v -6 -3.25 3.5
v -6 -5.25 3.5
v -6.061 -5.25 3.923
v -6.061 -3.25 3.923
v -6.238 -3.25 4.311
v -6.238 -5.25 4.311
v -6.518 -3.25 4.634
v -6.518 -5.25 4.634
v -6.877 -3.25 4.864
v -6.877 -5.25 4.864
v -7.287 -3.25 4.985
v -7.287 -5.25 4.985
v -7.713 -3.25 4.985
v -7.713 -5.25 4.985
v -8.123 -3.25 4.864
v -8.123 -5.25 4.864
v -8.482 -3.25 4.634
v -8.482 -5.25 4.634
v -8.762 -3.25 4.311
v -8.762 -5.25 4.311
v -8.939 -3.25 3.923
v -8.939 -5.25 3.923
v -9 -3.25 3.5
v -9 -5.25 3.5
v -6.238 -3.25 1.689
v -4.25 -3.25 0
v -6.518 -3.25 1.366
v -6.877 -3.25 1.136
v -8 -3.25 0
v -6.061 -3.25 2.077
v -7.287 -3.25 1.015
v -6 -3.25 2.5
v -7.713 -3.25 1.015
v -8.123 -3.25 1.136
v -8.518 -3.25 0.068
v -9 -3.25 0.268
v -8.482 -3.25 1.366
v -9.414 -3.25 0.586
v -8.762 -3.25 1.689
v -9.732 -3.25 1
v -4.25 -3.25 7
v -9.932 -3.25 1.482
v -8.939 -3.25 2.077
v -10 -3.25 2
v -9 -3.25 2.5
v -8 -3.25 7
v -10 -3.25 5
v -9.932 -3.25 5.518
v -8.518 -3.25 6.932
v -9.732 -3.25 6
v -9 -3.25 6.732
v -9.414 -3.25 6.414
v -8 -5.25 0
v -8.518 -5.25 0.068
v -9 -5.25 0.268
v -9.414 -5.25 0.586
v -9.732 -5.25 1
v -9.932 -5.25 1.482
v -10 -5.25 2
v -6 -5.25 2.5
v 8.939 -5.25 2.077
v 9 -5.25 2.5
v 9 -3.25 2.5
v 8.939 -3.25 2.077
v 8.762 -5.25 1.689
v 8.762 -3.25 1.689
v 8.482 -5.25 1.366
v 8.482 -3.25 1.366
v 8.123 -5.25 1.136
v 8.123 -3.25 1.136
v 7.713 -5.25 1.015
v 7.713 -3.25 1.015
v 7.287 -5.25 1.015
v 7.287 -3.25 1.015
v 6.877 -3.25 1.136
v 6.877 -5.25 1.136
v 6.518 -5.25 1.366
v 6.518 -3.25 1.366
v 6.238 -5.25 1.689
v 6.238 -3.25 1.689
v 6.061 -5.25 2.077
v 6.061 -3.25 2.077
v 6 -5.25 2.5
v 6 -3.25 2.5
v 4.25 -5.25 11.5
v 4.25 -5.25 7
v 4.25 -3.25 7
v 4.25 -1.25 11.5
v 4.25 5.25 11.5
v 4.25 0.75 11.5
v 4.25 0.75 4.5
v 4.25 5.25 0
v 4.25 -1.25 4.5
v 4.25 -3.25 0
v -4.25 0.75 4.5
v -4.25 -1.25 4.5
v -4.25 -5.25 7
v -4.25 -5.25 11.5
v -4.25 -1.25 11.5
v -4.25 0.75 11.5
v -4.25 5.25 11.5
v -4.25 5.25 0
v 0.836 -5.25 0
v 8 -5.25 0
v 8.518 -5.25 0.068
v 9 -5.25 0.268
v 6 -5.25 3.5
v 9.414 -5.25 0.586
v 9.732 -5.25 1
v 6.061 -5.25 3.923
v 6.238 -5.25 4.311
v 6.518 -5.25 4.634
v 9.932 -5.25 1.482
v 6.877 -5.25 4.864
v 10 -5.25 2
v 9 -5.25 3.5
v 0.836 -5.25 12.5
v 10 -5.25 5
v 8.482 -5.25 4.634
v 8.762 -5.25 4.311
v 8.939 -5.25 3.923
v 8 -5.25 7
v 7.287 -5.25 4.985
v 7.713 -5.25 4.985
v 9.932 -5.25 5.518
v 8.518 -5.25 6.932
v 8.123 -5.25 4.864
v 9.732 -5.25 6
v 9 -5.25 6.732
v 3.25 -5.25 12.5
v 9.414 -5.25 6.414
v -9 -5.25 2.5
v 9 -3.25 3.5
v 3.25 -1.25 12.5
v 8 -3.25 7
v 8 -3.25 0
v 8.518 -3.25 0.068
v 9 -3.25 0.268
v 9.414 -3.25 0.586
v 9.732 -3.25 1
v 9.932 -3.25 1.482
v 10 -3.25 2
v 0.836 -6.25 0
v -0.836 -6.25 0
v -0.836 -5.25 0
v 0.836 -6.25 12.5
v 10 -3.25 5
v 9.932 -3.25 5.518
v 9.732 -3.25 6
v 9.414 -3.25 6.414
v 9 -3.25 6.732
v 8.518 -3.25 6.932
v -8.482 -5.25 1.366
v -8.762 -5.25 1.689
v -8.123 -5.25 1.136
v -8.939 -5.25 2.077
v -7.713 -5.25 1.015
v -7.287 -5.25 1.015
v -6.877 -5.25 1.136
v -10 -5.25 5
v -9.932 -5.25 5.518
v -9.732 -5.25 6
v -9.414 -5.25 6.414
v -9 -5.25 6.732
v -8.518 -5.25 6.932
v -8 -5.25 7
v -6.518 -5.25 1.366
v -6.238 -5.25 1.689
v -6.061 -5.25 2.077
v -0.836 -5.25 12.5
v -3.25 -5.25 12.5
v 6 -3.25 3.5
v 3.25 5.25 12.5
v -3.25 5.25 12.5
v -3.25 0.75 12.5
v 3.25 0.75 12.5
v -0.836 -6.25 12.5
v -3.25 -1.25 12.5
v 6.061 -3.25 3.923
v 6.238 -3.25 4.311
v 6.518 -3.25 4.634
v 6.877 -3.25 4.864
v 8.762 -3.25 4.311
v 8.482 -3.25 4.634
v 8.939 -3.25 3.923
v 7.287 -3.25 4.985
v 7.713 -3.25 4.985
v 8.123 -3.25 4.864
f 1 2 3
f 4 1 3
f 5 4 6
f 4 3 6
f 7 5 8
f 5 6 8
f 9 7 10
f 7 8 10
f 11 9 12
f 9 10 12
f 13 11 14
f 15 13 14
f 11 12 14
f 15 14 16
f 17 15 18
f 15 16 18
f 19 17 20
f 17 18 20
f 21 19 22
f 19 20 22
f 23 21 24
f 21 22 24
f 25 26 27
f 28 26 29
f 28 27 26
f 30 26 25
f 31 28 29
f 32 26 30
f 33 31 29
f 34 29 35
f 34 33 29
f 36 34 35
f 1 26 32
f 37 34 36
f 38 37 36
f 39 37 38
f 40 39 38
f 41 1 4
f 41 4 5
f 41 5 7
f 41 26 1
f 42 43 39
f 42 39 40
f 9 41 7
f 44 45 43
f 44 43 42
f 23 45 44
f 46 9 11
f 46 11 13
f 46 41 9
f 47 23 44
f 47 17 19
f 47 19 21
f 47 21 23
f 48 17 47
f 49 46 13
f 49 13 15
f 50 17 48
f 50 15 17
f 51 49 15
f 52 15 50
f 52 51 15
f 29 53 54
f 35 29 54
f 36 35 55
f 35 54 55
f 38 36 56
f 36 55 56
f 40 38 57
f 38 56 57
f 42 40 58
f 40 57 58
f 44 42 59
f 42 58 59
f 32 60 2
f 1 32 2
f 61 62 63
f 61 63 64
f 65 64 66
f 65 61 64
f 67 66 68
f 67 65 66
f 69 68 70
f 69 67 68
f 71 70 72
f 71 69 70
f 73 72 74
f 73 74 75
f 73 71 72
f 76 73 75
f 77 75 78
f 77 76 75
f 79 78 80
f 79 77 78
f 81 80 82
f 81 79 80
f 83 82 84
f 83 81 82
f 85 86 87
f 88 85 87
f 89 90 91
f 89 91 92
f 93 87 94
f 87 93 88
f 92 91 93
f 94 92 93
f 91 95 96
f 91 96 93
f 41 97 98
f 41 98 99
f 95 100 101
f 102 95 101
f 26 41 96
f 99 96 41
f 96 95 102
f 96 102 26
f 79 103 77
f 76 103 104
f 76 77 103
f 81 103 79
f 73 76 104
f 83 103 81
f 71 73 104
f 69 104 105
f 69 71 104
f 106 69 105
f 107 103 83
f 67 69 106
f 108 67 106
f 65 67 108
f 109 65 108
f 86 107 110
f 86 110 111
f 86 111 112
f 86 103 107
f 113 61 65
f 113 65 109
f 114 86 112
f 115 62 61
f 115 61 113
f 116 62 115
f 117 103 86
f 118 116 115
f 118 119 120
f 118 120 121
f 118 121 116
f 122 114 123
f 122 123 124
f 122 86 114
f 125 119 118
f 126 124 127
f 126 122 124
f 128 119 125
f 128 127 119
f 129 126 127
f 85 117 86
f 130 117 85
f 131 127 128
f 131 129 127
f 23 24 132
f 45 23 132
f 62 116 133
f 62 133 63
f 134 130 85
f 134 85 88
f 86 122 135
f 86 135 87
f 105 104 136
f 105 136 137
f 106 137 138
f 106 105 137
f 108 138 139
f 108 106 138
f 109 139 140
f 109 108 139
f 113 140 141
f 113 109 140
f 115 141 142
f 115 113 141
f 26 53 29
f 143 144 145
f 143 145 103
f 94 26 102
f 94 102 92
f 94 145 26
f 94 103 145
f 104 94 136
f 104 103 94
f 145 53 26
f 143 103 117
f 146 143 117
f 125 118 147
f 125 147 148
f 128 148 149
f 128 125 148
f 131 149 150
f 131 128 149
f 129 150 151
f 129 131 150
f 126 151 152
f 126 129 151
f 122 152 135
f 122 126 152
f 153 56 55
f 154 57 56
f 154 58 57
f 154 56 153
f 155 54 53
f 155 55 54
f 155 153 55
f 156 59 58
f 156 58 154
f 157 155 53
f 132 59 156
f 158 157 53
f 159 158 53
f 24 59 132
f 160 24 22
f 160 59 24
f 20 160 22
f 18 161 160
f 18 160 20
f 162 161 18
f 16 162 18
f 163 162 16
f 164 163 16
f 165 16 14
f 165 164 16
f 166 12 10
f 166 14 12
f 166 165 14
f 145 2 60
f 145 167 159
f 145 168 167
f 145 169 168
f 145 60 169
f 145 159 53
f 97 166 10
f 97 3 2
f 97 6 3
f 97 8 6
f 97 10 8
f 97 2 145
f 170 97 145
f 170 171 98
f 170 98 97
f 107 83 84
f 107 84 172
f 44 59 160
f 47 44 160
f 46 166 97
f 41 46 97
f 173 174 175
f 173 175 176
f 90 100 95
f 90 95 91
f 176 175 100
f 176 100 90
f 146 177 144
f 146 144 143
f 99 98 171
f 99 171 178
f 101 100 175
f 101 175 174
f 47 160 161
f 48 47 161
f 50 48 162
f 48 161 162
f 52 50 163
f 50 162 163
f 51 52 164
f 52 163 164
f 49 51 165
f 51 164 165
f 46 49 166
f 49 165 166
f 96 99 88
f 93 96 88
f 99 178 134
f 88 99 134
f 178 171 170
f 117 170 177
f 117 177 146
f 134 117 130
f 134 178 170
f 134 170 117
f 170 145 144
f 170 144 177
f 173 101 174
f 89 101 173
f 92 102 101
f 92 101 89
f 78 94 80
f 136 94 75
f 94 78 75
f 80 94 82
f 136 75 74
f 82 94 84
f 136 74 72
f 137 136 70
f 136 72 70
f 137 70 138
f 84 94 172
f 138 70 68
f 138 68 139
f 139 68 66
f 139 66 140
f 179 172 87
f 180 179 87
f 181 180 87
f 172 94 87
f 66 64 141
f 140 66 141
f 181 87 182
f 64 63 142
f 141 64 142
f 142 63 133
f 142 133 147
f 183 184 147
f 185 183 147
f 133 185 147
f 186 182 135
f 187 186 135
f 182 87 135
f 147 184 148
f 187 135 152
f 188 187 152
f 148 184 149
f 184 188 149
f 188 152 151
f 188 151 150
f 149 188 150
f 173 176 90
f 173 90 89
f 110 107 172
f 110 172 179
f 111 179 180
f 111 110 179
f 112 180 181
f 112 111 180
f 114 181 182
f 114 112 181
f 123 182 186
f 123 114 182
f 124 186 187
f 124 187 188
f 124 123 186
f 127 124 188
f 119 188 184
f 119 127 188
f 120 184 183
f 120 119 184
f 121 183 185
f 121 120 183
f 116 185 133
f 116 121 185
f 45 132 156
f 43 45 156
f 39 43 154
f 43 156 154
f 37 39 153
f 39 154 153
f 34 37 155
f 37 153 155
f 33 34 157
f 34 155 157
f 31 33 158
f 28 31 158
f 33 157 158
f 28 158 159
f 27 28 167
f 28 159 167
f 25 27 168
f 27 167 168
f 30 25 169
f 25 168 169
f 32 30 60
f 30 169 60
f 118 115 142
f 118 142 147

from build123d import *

# Parameters (mm, degrees)
SKETCH1_W           = 8.5
SKETCH1_H           = 10.5
BOSS_EXTRUDE1_DEPTH = 12.5
SKETCH2_W           = 8.5
SKETCH2_H           = 2
CUT_EXTRUDE1_DEPTH  = 8
BOSS_EXTRUDE2_DEPTH = 2
CHAMFER1_SIZE       = 1
SKETCH4_W           = 1.671920984
SKETCH4_H           = 12.5
BOSS_EXTRUDE3_DEPTH = 1


with BuildPart() as part:
    # Sketch1 → Boss-Extrude1 (new body)
    with BuildSketch(Plane.XY):
        Rectangle(SKETCH1_W, SKETCH1_H)
    extrude(amount=BOSS_EXTRUDE1_DEPTH)

    # Sketch2 → Cut-Extrude1 (cut)
    with BuildSketch(Plane.XY.offset(12.5)):
        with Locations((0, -0.25)):
            Rectangle(SKETCH2_W, SKETCH2_H)
    extrude(amount=-CUT_EXTRUDE1_DEPTH, mode=Mode.SUBTRACT)

    # Sketch3 → Boss-Extrude2 (add)
    # profile 1 of 2: a face of its own
    with BuildSketch(Plane.XZ.offset(5.25)):
        with BuildLine():
            Line((4.25, 0), (8, 0))
            ThreePointArc((8, 0), (9.414213562, 0.585786438), (10, 2))
            Line((10, 2), (10, 5))
            ThreePointArc((10, 5), (9.414213562, 6.414213562), (8, 7))
            Line((8, 7), (4.25, 7))
            Line((4.25, 7), (4.25, 0))
        make_face()
        with BuildLine():
            Line((6, 2.5), (6, 3.5))
            ThreePointArc((6, 3.5), (7.5, 5), (9, 3.5))
            Line((9, 3.5), (9, 2.5))
            ThreePointArc((9, 2.5), (7.5, 1), (6, 2.5))
        make_face(mode=Mode.SUBTRACT)
    # profile 2 of 2: a face of its own
    with BuildSketch(Plane.XZ.offset(5.25)):
        with BuildLine():
            Line((-10, 2), (-10, 5))
            ThreePointArc((-10, 5), (-9.414213562, 6.414213562), (-8, 7))
            Line((-8, 7), (-4.25, 7))
            Line((-4.25, 7), (-4.25, 0))
            Line((-4.25, 0), (-8, 0))
            ThreePointArc((-8, 0), (-9.414213562, 0.585786438), (-10, 2))
        make_face()
        with BuildLine():
            Line((-6, 2.5), (-6, 3.5))
            ThreePointArc((-6, 3.5), (-7.5, 5), (-9, 3.5))
            Line((-9, 3.5), (-9, 2.5))
            ThreePointArc((-9, 2.5), (-7.5, 1), (-6, 2.5))
        make_face(mode=Mode.SUBTRACT)
    extrude(amount=-BOSS_EXTRUDE2_DEPTH)

    # Chamfer1
    chamfer1_edges = [part.edges().sort_by_distance(p)[0] for p in [
        (-4.25, 3, 12.5),
        (4.25, 3, 12.5),
        (-4.25, -3.25, 12.5),
        (4.25, -3.25, 12.5),
    ]]
    chamfer(chamfer1_edges, length=CHAMFER1_SIZE)

    # Sketch4 → Boss-Extrude3 (add)
    with BuildSketch(Plane.XZ.offset(5.25)):
        with Locations((0, 6.25)):
            Rectangle(SKETCH4_W, SKETCH4_H)
    extrude(amount=BOSS_EXTRUDE3_DEPTH)


solid = part.part
